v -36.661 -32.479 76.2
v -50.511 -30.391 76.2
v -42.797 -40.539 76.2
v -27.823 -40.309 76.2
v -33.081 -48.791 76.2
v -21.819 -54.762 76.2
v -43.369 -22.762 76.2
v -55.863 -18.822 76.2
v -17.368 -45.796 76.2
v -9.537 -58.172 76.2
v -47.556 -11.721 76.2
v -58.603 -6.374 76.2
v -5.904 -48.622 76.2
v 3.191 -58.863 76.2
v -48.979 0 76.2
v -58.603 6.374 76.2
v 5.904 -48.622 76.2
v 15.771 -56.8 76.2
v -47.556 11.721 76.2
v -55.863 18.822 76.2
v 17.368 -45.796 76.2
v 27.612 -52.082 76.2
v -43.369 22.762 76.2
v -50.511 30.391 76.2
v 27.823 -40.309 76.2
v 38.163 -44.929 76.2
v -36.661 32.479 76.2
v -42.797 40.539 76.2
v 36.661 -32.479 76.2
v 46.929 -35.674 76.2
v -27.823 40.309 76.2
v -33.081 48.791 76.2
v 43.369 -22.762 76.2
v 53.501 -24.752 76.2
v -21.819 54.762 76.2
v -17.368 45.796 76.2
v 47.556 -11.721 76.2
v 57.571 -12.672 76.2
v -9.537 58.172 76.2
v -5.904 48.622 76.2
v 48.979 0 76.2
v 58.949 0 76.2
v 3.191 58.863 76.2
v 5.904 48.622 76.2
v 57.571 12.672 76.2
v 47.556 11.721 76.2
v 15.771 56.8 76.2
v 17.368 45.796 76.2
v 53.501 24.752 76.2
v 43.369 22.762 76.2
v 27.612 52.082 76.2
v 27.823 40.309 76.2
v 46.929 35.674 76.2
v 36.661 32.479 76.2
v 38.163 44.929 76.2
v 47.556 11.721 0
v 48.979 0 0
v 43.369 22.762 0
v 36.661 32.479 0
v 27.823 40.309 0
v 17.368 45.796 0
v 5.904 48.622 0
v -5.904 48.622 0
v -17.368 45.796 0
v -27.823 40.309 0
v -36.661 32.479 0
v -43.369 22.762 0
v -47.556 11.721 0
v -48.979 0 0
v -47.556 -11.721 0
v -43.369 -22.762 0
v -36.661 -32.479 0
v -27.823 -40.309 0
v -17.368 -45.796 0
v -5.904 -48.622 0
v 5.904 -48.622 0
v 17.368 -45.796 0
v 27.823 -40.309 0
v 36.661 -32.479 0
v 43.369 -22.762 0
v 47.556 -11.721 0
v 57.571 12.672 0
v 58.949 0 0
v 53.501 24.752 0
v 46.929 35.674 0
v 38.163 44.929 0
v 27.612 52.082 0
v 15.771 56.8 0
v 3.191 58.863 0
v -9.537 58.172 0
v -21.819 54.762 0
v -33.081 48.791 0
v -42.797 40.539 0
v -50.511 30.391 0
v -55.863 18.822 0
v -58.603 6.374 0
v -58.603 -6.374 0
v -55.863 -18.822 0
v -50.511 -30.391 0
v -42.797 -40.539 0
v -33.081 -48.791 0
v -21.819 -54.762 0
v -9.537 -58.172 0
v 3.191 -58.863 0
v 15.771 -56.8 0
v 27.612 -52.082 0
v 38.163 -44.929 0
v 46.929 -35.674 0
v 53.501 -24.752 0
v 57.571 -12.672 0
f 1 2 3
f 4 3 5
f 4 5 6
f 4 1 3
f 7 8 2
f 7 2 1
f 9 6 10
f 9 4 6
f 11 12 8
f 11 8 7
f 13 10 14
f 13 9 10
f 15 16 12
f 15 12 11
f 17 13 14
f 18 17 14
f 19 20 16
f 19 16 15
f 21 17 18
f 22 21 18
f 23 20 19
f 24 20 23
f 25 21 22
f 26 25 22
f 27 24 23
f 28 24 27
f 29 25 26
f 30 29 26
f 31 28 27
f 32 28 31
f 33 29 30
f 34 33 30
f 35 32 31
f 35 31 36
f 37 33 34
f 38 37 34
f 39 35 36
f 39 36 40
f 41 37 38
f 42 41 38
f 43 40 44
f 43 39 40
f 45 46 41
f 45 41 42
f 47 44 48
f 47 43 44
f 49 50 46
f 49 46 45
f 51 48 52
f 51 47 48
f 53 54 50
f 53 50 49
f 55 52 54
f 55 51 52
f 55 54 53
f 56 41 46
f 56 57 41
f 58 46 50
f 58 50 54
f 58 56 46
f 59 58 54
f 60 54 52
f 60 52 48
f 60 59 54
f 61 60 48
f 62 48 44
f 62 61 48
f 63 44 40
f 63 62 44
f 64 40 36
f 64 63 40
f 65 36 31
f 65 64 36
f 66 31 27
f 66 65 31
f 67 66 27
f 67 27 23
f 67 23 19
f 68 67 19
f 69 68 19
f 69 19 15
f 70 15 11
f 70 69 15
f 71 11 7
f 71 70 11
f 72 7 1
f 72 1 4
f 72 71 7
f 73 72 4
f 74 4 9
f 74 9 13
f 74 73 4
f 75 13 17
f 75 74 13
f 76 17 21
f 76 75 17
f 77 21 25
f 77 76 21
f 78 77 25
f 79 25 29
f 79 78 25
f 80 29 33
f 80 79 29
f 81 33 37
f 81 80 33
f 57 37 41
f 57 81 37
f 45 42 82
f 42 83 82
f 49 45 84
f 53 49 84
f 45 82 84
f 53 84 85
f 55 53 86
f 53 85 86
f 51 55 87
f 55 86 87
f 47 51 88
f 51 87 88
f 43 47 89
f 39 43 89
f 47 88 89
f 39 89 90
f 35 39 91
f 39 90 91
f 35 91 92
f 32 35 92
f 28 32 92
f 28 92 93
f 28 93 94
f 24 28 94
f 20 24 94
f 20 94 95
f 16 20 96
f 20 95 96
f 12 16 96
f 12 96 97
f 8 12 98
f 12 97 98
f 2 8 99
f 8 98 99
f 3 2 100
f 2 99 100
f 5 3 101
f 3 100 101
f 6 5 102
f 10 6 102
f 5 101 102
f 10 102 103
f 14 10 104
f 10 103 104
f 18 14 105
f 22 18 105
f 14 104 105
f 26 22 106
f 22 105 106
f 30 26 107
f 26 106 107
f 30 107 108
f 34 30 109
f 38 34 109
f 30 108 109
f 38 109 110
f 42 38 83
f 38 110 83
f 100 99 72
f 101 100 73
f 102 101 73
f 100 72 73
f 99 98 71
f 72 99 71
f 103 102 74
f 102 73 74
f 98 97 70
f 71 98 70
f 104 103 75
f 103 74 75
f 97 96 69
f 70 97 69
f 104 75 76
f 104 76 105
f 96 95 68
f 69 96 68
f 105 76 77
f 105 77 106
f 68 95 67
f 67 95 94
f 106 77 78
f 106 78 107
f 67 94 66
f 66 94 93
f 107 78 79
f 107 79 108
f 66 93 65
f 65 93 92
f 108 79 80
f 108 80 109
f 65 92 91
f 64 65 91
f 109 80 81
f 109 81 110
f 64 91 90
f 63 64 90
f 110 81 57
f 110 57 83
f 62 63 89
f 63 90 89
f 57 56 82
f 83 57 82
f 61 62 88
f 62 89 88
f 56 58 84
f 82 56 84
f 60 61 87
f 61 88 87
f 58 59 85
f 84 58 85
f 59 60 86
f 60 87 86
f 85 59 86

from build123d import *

# Parameters (mm, degrees)
F0_R     = 58.9489571111
F0_R_2   = 48.9787868108
F1_DEPTH = 25.4
F2_DEPTH = 25.4
F3_DEPTH = 25.4


with BuildPart() as f1:
    # F0 (on Top) → F1 (new body)
    with BuildSketch(Plane.XY):
        Circle(F0_R)
        Circle(F0_R_2, mode=Mode.SUBTRACT)
    extrude(amount=F1_DEPTH)

    # F2 (add): faces of the model
    f2_faces = [f1.faces().sort_by_distance(p)[0] for p in [
        (-57.2816288184, 0, 25.4),
        (-57.2816288184, 0, 0),
    ]]
    extrude(f2_faces, amount=F2_DEPTH, dir=(0, 0, 1))

    # F3 (add): a face of the model
    f3_faces = [f1.faces().sort_by_distance(p)[0] for p in [
        (-57.2816288184, 0, 50.8),
    ]]
    extrude(f3_faces, amount=F3_DEPTH)


solid = f1.part
